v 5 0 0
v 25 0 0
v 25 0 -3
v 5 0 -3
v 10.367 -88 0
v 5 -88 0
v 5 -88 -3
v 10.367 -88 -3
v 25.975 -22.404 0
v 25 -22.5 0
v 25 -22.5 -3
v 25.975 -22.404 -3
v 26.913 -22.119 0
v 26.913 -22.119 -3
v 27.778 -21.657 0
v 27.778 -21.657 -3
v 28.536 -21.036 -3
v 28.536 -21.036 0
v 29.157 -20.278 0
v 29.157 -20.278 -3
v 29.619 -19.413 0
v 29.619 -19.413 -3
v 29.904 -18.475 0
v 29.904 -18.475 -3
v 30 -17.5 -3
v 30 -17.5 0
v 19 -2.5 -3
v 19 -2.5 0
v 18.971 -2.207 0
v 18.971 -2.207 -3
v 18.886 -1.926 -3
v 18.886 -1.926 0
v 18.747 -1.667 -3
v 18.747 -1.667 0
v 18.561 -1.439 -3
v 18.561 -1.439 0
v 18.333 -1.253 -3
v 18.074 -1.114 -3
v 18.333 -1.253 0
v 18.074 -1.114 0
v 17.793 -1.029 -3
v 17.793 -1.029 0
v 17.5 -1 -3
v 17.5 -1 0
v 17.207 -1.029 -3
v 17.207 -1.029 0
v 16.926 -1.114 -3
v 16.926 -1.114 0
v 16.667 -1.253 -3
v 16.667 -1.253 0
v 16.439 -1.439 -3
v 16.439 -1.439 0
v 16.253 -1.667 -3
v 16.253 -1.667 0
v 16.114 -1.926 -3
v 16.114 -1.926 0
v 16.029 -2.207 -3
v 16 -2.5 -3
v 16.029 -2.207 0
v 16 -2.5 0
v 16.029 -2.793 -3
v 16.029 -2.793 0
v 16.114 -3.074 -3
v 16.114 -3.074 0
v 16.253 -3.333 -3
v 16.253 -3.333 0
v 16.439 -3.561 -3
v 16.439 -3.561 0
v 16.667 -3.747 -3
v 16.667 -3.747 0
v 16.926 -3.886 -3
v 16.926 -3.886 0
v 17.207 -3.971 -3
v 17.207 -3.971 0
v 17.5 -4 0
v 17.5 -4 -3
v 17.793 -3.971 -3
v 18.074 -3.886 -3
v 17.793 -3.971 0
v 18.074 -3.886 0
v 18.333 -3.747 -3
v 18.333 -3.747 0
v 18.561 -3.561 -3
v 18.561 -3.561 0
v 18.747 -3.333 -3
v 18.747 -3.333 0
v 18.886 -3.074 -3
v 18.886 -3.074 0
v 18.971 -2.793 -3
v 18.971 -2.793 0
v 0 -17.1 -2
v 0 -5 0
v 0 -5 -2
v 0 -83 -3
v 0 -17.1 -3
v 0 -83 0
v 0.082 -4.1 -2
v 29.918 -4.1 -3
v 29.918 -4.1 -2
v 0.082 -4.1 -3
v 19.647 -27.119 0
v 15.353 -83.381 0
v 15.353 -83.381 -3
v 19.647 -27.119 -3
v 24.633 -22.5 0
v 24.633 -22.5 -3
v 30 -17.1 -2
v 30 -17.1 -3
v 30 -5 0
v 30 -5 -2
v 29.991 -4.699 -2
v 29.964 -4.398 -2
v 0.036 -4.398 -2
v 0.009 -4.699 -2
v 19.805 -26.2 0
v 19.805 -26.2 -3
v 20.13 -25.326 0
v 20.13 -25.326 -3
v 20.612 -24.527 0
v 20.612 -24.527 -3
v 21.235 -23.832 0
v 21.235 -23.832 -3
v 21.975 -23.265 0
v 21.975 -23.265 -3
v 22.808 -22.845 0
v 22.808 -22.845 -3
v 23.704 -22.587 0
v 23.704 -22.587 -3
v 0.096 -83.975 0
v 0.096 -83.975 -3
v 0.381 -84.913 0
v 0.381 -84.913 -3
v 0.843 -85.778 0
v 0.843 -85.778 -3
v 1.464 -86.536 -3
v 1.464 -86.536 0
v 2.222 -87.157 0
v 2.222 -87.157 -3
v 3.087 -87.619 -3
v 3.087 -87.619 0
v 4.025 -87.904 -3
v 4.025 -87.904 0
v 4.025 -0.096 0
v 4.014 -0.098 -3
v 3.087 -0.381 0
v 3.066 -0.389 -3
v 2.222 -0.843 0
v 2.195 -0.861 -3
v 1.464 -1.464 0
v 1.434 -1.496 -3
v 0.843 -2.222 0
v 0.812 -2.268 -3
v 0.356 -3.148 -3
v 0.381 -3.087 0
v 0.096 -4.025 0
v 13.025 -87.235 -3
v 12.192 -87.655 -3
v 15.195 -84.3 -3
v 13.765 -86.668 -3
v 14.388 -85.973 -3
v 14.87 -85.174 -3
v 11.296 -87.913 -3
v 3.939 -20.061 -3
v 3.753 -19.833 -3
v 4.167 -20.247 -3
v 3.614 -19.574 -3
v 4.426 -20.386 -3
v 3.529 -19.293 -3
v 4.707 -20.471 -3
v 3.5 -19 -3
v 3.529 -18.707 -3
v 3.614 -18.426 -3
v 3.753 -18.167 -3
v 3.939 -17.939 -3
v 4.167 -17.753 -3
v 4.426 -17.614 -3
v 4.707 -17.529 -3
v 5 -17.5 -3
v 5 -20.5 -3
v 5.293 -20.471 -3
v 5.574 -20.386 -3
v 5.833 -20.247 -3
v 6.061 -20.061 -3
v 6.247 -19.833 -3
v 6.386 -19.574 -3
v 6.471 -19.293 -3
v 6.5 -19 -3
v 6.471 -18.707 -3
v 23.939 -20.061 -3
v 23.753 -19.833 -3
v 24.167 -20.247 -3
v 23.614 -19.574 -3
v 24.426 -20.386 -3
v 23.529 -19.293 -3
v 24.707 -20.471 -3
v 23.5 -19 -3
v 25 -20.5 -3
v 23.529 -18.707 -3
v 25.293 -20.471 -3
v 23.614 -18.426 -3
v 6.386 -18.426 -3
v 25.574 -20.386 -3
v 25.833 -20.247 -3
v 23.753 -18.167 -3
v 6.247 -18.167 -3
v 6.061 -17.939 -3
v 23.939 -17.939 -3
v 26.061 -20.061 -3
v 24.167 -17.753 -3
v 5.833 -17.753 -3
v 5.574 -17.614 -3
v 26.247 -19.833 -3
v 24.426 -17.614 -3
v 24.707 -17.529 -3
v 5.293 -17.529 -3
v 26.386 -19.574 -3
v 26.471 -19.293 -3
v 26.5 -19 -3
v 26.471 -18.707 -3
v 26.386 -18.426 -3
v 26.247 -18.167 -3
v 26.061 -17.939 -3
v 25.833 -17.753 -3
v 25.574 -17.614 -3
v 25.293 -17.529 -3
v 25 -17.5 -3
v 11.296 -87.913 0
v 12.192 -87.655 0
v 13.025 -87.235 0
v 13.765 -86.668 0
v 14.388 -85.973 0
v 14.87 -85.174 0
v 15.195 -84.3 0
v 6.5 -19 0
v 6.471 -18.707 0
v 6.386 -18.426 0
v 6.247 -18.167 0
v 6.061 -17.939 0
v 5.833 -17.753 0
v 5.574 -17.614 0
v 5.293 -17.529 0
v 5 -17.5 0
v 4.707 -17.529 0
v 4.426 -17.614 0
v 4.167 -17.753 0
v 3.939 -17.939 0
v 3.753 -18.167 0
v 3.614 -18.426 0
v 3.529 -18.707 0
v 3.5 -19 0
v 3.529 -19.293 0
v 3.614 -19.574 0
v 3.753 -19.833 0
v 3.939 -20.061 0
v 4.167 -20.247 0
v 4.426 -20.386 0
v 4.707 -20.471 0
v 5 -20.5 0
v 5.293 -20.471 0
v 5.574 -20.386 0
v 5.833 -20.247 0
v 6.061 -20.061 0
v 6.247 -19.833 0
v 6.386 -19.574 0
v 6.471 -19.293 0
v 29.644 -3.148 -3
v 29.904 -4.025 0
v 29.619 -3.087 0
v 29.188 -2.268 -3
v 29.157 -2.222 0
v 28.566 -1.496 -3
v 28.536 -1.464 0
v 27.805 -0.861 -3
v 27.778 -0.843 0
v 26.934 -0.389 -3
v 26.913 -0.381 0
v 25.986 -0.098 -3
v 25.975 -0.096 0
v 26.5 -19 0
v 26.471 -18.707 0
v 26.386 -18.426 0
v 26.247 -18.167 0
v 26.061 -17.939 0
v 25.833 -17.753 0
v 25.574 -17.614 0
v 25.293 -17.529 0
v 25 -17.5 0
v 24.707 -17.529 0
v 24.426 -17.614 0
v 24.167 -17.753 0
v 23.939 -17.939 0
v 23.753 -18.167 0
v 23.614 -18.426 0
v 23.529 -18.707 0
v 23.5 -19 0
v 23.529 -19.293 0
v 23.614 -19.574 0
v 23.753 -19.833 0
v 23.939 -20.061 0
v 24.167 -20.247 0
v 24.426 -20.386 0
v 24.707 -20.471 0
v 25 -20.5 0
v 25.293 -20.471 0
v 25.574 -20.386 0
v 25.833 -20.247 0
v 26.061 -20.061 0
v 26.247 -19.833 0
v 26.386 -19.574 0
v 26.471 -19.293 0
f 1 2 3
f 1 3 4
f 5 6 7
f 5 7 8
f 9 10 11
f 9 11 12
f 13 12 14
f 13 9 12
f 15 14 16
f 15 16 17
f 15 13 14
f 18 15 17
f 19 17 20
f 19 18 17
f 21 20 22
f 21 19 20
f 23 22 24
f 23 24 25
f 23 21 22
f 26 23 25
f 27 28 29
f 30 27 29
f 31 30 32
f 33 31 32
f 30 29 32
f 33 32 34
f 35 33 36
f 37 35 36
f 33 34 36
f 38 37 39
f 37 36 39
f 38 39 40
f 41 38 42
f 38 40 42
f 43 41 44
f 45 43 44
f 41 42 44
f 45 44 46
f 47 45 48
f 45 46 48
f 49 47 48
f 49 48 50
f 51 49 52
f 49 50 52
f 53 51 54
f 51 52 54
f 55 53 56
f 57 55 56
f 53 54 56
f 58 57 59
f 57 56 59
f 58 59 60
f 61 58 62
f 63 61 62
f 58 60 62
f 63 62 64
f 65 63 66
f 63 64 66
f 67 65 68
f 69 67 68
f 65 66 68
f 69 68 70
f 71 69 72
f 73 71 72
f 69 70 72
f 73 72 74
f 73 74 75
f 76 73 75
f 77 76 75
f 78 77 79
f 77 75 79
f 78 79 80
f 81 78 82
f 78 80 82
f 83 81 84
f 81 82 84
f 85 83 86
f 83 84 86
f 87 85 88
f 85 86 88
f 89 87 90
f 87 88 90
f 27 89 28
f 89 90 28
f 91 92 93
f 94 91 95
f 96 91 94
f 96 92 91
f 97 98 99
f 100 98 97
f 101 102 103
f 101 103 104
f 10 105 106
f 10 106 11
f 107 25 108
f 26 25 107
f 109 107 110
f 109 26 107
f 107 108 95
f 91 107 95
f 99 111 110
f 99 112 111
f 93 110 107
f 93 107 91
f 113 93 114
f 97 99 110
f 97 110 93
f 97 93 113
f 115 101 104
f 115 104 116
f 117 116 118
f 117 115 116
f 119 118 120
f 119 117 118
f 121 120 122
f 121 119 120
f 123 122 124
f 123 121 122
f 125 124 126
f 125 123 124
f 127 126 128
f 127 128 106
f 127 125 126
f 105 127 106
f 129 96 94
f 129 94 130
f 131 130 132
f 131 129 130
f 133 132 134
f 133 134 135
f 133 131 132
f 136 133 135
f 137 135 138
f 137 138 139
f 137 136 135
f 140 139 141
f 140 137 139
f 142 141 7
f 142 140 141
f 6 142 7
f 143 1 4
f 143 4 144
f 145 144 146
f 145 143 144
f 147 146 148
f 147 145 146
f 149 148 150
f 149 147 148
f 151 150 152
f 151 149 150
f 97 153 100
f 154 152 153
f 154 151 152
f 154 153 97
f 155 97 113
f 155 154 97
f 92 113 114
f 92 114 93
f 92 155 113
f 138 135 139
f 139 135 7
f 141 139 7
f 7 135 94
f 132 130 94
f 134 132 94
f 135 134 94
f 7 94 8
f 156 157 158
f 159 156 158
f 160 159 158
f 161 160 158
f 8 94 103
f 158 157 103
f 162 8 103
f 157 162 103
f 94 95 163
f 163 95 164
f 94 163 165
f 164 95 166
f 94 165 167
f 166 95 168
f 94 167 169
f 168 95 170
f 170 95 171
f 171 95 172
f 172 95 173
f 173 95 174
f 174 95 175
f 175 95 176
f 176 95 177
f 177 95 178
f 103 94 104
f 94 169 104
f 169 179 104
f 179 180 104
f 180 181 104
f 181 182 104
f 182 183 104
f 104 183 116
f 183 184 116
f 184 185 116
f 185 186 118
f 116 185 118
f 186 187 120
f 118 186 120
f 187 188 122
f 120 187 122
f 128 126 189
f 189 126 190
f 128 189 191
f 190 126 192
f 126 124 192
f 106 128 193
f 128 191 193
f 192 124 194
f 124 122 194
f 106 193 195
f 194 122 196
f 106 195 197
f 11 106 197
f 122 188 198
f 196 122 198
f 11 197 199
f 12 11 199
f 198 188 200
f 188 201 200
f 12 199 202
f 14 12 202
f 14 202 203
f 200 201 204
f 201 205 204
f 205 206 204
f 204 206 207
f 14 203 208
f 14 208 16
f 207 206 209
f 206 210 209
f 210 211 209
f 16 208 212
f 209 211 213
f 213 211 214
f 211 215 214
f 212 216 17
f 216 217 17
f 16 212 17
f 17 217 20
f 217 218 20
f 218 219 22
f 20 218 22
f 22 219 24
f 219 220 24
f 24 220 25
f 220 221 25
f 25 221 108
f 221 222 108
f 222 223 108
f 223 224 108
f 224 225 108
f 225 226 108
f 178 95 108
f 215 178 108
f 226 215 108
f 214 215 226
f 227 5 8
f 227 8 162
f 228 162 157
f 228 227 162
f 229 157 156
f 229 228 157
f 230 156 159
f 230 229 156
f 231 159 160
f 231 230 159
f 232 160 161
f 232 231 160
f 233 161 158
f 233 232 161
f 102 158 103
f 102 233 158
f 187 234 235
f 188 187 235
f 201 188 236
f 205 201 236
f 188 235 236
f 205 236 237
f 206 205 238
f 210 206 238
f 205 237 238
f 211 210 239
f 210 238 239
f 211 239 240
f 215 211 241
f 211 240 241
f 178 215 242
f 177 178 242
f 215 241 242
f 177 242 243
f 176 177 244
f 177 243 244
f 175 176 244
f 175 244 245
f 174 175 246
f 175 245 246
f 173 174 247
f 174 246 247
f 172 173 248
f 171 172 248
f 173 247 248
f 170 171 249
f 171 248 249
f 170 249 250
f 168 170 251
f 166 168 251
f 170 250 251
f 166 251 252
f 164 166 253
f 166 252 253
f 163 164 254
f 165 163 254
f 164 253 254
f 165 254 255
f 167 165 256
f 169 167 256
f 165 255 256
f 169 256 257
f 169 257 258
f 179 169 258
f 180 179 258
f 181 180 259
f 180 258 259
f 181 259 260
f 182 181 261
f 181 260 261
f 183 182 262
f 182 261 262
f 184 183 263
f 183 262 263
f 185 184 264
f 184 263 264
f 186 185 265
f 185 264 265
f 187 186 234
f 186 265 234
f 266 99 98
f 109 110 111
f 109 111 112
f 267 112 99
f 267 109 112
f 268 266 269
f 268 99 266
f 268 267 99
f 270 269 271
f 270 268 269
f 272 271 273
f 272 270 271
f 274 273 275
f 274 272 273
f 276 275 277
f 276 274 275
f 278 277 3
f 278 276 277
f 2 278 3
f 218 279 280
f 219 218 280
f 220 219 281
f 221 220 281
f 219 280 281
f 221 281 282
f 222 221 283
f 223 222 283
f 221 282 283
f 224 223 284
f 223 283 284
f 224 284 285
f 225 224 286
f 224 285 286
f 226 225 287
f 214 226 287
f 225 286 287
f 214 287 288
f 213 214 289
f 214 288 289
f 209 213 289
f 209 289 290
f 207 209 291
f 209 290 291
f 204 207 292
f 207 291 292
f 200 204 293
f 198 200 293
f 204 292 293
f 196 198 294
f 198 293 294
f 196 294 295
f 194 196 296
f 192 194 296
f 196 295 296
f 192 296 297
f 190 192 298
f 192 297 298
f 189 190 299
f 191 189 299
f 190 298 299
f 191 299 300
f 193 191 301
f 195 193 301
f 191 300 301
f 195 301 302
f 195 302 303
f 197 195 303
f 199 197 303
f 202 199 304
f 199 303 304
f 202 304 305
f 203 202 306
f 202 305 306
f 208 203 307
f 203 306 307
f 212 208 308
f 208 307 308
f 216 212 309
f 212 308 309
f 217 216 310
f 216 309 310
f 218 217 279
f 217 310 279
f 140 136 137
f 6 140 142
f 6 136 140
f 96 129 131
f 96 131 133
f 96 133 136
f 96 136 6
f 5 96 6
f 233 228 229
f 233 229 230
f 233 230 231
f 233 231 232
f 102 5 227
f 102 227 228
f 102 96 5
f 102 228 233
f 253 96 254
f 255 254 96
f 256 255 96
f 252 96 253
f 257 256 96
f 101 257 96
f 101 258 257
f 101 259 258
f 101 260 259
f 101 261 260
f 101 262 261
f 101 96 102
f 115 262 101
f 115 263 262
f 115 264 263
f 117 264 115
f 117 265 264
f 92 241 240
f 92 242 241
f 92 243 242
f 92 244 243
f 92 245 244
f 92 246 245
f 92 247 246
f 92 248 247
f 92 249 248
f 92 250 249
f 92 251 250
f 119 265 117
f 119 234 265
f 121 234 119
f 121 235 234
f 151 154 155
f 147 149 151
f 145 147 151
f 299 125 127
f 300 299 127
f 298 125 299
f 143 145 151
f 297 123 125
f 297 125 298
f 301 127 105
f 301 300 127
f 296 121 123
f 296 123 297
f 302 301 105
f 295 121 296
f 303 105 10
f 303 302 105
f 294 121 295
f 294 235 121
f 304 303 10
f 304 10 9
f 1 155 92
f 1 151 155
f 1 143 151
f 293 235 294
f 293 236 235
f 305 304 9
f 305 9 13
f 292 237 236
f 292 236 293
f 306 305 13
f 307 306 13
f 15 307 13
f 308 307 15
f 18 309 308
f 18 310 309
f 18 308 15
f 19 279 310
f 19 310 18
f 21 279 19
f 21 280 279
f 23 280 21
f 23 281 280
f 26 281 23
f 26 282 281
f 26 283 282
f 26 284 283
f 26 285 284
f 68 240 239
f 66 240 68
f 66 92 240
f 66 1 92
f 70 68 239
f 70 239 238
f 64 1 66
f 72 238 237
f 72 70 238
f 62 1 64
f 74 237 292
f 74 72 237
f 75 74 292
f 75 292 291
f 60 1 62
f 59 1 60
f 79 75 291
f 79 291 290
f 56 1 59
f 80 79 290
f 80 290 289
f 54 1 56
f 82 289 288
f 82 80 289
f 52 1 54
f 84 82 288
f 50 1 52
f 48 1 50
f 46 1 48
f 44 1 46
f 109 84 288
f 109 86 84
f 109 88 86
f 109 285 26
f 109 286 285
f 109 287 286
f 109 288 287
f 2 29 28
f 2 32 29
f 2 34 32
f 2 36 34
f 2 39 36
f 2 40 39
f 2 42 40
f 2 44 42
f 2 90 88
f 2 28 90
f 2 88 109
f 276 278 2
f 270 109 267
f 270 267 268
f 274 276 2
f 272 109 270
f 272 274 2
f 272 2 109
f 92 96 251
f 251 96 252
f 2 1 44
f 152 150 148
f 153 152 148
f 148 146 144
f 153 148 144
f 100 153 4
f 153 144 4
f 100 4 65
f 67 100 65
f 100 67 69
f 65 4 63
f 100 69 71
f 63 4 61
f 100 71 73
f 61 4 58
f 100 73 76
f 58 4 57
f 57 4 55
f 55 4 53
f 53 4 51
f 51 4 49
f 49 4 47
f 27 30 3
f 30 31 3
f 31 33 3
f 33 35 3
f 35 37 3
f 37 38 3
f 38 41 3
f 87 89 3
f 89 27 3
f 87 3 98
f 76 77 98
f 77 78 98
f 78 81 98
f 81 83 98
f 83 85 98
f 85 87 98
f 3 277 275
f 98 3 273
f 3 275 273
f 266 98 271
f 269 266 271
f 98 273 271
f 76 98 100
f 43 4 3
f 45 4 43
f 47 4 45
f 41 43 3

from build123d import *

# Parameters (mm, degrees)
CROQUIS1_R              = 1.5
SALIENTE_EXTRUIR1_DEPTH = 3
CROQUIS2_W              = 30
CROQUIS2_H              = 13
CORTAR_EXTRUIR2_DEPTH   = 1


with BuildPart() as part:
    # Croquis1 → Saliente-Extruir1 (new body)
    with BuildSketch(Plane.XY):
        with BuildLine():
            Line((0, -5), (0, -83))
            ThreePointArc((0, -83), (1.464466094, -86.535533906), (5, -88))
            Line((5, -88), (10.367132634, -88))
            ThreePointArc((10.367132634, -88), (13.765451273, -86.667619177), (15.352628079, -83.380572171))
            Line((15.352628079, -83.380572171), (19.647371921, -27.119427829))
            ThreePointArc((19.647371921, -27.119427829), (21.234548727, -23.832380823), (24.632867366, -22.5))
            Line((24.632867366, -22.5), (25, -22.5))
            ThreePointArc((25, -22.5), (28.535533906, -21.035533906), (30, -17.5))
            Line((30, -17.5), (30, -5))
            ThreePointArc((30, -5), (28.535533906, -1.464466094), (25, 0))
            Line((25, 0), (5, 0))
            ThreePointArc((5, 0), (1.464466094, -1.464466094), (0, -5))
        make_face()
        with Locations((17.5, -2.5)):
            Circle(CROQUIS1_R, mode=Mode.SUBTRACT)
        with Locations((5, -19)):
            Circle(CROQUIS1_R, mode=Mode.SUBTRACT)
        with Locations((25, -19)):
            Circle(CROQUIS1_R, mode=Mode.SUBTRACT)
    extrude(amount=-SALIENTE_EXTRUIR1_DEPTH)

    # Croquis2 → Cortar-Extruir2 (cut)
    with BuildSketch(Plane(origin=(0, 0, -3), x_dir=(-1, 0, 0), z_dir=(0, 0, -1))):
        with Locations((-15, -10.6)):
            Rectangle(CROQUIS2_W, CROQUIS2_H)
    extrude(amount=-CORTAR_EXTRUIR2_DEPTH, mode=Mode.SUBTRACT)


solid = part.part
